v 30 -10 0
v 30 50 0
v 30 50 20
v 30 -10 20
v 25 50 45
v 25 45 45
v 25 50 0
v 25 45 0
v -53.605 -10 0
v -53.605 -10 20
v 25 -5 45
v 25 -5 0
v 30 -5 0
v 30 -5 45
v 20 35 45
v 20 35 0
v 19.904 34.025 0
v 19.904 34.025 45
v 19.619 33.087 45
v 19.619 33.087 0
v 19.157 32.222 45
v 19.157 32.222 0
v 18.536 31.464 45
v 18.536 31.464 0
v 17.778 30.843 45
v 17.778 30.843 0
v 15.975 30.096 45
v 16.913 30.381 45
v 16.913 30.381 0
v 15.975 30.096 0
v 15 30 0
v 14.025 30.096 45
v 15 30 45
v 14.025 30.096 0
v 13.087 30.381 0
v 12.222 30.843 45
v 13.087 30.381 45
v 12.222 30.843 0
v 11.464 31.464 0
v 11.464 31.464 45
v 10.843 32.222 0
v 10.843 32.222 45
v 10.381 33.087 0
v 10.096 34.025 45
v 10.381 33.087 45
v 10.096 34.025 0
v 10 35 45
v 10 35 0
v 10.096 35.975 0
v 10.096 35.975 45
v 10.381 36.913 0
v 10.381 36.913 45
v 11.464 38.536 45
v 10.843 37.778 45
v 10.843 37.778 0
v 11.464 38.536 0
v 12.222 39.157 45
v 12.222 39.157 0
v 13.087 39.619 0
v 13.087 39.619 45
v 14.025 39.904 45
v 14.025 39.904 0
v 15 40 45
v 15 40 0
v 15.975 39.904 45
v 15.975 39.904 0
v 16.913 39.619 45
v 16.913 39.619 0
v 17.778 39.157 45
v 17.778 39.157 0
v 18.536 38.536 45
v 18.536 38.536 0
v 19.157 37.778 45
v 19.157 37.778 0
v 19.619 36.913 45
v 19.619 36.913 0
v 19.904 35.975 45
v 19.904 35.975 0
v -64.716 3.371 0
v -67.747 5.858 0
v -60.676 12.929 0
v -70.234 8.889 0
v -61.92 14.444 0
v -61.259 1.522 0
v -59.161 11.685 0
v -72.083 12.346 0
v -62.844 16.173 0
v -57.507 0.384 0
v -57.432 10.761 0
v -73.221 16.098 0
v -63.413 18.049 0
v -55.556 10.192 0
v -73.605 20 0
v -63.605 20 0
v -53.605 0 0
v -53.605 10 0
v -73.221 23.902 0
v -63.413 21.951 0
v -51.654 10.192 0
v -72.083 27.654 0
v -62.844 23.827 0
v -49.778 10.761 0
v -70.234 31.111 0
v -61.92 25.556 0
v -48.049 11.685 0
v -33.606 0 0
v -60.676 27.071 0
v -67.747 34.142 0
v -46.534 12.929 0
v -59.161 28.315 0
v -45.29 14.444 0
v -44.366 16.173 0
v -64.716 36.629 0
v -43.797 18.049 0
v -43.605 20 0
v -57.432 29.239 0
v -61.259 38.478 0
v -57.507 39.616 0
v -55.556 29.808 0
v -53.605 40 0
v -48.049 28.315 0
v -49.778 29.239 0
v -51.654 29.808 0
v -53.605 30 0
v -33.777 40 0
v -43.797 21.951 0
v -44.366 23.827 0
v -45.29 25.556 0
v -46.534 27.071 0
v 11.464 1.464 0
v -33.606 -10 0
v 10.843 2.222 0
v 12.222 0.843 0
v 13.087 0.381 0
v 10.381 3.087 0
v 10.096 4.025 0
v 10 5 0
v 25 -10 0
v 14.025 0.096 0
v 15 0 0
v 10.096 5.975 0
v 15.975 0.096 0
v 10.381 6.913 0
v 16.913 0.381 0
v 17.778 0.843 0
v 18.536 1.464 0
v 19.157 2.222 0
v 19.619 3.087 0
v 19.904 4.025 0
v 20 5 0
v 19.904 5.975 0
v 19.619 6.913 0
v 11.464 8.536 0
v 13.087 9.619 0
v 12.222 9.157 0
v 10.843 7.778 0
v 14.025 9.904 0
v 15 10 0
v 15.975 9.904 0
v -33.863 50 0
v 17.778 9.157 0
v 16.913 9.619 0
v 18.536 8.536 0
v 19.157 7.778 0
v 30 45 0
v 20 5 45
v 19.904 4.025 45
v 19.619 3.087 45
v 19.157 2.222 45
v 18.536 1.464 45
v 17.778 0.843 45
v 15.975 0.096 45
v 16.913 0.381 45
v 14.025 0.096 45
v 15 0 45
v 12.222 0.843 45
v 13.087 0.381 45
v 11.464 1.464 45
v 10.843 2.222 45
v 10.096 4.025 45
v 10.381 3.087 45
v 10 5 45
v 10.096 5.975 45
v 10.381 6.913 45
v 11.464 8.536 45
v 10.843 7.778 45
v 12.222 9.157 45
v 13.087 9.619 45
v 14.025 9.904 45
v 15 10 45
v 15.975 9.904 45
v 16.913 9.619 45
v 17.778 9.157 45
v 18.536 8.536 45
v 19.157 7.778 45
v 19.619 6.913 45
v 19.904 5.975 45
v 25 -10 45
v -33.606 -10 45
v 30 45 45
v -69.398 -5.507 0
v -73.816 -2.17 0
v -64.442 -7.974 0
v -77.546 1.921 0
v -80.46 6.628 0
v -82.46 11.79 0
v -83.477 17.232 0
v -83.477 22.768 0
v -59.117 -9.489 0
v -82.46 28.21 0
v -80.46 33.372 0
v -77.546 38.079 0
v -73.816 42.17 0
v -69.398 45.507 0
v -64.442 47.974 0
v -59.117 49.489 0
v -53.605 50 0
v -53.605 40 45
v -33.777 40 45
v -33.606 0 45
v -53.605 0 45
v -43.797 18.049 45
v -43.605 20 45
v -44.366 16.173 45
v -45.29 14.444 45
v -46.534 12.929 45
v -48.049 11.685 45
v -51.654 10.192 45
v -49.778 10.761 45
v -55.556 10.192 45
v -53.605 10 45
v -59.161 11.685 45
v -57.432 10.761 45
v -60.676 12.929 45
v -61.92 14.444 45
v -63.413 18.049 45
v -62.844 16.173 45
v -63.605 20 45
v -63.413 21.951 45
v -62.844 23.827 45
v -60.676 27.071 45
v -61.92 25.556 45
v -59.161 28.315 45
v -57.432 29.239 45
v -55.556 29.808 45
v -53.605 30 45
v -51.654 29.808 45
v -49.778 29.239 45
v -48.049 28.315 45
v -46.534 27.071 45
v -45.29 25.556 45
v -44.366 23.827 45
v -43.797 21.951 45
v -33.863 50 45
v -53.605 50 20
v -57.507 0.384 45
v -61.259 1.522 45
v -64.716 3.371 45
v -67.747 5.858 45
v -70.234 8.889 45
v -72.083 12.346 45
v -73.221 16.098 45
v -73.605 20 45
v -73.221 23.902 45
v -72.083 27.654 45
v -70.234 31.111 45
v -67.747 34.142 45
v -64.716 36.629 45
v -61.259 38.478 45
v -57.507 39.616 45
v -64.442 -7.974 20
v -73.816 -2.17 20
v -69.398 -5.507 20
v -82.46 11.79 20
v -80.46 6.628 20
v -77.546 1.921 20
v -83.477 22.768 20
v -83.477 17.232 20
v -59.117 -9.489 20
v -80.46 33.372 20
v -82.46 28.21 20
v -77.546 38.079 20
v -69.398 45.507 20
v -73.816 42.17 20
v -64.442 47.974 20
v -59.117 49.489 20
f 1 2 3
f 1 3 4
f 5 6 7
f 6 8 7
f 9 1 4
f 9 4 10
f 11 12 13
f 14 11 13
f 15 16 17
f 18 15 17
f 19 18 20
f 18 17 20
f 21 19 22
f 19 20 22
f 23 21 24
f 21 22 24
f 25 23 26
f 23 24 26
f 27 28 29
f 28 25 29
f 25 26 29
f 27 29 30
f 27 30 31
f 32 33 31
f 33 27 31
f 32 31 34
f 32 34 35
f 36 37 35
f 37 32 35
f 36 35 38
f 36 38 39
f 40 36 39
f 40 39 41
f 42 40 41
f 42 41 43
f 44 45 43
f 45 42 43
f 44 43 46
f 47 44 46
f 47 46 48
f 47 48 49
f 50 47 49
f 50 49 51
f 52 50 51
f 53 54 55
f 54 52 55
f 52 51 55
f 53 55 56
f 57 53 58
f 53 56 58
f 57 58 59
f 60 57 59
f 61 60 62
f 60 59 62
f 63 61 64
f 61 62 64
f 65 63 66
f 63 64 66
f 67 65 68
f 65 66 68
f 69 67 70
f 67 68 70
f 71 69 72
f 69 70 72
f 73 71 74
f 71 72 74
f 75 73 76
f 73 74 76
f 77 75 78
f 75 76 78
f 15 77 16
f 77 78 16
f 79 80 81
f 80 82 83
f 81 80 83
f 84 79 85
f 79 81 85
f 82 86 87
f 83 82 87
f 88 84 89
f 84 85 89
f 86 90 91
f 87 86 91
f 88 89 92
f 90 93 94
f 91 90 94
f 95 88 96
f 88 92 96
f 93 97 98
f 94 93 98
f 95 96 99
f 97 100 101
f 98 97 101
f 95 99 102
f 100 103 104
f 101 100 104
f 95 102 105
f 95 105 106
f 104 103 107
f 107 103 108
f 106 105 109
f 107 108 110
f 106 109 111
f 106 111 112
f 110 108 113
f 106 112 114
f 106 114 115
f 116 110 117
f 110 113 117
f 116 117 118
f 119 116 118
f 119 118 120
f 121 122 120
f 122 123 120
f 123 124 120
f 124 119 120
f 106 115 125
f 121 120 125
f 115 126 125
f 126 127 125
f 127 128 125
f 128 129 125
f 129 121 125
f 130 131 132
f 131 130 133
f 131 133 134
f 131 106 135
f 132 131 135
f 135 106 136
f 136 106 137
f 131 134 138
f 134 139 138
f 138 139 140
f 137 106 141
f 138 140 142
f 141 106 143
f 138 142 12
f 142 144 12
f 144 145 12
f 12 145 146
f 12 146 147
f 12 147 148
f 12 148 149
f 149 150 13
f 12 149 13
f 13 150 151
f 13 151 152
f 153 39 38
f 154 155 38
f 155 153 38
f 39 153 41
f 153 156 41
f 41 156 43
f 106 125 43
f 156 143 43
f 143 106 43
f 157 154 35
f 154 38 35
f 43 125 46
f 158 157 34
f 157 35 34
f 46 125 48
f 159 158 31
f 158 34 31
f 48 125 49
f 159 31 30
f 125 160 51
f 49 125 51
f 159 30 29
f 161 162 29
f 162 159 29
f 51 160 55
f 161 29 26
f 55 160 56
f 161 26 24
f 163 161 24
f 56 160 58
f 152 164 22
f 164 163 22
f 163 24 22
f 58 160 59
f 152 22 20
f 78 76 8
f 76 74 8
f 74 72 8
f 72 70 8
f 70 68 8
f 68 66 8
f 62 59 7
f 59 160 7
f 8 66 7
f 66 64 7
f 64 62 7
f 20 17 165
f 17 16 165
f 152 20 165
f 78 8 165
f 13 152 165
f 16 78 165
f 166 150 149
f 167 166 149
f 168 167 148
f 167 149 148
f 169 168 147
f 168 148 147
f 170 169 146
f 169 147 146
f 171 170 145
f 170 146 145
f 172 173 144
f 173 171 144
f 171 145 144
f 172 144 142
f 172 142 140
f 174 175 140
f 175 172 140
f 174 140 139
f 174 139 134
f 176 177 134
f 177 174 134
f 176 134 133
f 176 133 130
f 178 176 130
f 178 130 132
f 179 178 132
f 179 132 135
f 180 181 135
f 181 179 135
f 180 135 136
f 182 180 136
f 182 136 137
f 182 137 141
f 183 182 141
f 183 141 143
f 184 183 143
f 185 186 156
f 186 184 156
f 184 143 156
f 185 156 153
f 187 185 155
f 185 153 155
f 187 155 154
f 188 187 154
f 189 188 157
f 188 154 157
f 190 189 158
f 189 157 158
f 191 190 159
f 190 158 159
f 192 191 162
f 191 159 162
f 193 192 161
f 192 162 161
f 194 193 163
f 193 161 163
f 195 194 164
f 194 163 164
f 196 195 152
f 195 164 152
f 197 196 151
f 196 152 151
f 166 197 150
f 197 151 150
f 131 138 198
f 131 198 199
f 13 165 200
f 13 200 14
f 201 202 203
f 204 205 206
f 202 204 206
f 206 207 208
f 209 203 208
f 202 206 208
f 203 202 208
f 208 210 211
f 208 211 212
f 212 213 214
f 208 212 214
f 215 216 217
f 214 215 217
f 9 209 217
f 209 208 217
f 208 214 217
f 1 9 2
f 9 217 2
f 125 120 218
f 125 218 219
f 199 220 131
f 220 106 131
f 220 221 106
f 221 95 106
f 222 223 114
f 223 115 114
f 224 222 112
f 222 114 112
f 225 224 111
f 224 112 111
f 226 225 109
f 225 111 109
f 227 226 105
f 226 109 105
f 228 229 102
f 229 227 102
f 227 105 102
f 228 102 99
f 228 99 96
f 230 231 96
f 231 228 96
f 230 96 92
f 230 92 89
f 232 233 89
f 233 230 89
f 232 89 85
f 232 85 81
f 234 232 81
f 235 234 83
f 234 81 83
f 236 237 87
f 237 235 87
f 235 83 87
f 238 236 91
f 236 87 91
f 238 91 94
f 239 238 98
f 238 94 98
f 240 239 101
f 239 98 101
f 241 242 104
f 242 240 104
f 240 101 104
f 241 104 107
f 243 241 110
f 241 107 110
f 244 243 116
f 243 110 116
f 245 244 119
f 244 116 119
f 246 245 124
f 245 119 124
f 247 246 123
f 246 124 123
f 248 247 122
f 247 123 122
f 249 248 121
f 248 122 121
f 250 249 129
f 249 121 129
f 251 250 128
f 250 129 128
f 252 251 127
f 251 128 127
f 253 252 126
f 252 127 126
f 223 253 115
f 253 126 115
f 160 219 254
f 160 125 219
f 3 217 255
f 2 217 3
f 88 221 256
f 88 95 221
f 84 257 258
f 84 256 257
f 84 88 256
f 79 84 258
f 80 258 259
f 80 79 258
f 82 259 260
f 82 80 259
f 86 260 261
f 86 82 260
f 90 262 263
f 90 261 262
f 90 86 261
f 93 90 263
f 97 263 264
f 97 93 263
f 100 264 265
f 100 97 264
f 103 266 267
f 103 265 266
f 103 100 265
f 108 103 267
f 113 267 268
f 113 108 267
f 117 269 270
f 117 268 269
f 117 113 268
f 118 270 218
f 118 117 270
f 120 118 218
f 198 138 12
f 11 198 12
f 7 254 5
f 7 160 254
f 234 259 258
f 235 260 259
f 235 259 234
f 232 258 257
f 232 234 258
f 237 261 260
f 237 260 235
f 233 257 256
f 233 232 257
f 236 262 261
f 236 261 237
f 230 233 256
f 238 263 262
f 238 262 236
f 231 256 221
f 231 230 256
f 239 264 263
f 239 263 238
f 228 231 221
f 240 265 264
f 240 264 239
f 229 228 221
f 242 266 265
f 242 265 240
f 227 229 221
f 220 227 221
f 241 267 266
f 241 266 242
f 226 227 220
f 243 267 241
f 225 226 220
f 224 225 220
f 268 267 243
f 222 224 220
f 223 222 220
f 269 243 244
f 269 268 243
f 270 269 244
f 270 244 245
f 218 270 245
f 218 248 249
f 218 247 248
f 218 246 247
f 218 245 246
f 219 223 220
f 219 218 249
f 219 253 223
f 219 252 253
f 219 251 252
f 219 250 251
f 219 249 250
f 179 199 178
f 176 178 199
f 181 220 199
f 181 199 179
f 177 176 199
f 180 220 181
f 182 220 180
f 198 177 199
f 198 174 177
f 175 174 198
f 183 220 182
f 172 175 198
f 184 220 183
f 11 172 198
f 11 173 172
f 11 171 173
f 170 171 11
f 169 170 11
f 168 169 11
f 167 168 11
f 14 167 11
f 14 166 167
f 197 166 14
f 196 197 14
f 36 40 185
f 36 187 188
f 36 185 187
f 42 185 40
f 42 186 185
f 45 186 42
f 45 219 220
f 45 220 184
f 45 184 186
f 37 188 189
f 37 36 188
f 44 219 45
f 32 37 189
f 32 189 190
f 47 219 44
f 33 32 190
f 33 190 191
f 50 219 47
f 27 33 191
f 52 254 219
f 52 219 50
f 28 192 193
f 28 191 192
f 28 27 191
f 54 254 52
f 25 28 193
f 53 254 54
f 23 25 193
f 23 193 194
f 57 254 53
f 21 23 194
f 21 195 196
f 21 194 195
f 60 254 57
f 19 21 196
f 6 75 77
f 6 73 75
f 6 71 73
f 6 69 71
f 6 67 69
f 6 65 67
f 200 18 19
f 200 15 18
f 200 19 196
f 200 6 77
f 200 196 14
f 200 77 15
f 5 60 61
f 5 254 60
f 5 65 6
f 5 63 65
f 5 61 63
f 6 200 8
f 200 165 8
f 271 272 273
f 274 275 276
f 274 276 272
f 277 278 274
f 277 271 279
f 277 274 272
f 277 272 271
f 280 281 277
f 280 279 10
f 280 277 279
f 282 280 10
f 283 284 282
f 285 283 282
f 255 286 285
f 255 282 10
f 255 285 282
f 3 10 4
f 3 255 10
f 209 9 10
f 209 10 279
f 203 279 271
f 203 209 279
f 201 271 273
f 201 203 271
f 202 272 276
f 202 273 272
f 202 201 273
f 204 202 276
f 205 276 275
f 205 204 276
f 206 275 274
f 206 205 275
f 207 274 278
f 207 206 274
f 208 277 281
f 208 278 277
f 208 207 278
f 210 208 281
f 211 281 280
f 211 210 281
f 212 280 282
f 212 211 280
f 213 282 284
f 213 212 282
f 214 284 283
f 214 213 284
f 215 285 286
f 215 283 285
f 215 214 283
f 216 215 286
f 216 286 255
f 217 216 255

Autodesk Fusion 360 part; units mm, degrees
sketch "Boceto1" plane through (0, 0, 0) normal (0, 0, 1) x (1, 0, 0)
  line L0 (-53.605, 50) -> (30, 50)
  line L1 (30, 50) -> (30, -10)
  line L2 (30, -10) -> (-53.605, -10)
  circle A0 centre (-53.605, 20) radius 10
  line L3 (25, 50) -> (30, 50)
  line L4 (30, 50) -> (30, 45)
  line L5 (30, 45) -> (25, 45)
  line L6 (25, 45) -> (25, 50)
  line L7 (30, -10) -> (25, -10)
  line L8 (25, -10) -> (25, -5)
  line L9 (25, -5) -> (30, -5)
  line L10 (30, -5) -> (30, -10)
  circle A1 centre (15, 5) radius 5
  circle A2 centre (15, 35) radius 5
  arc A3 (-53.605, 50) -> (-53.605, -10) centre (-53.605, 20) ccw
  line L11 (-33.7768, 40) -> (-33.8631, 50)
  arc A4 (-53.605, 40) -> (-53.605, 0) centre (-53.605, 20) ccw
  arc A5 (-33.6057, 19.8275) -> (-33.6057, 20.1725) centre (-53.605, 20) ccw
  line L12 (-53.605, 40) -> (-33.7768, 40)
  line L13 (-53.605, 0) -> (-33.6057, 0)
  line L14 (-33.6057, 22.9183) -> (-33.6057, 19.8275)
  line L15 (-33.6057, 0) -> (-33.6057, -10)
extrude "Extruir1" add sketch "Boceto1" along normal blind 20 contours L0 L2 A3 L11 A4 L12 L13 L15 | L0 L1 L2 L5 L6 L8 L9 L11 A4 L12 L13 L15 | L0 L1 L3 L4 L5 L6 | L1 L2 L7 L8 L9 L10 | A0 | A1 | A2 makes body 1
extrude "Extruir2" add sketch "Boceto1" along normal blind 45 separate body contours L0 L1 L2 L5 L6 L8 L9 L11 A4 L12 L13 L15 makes body 2
